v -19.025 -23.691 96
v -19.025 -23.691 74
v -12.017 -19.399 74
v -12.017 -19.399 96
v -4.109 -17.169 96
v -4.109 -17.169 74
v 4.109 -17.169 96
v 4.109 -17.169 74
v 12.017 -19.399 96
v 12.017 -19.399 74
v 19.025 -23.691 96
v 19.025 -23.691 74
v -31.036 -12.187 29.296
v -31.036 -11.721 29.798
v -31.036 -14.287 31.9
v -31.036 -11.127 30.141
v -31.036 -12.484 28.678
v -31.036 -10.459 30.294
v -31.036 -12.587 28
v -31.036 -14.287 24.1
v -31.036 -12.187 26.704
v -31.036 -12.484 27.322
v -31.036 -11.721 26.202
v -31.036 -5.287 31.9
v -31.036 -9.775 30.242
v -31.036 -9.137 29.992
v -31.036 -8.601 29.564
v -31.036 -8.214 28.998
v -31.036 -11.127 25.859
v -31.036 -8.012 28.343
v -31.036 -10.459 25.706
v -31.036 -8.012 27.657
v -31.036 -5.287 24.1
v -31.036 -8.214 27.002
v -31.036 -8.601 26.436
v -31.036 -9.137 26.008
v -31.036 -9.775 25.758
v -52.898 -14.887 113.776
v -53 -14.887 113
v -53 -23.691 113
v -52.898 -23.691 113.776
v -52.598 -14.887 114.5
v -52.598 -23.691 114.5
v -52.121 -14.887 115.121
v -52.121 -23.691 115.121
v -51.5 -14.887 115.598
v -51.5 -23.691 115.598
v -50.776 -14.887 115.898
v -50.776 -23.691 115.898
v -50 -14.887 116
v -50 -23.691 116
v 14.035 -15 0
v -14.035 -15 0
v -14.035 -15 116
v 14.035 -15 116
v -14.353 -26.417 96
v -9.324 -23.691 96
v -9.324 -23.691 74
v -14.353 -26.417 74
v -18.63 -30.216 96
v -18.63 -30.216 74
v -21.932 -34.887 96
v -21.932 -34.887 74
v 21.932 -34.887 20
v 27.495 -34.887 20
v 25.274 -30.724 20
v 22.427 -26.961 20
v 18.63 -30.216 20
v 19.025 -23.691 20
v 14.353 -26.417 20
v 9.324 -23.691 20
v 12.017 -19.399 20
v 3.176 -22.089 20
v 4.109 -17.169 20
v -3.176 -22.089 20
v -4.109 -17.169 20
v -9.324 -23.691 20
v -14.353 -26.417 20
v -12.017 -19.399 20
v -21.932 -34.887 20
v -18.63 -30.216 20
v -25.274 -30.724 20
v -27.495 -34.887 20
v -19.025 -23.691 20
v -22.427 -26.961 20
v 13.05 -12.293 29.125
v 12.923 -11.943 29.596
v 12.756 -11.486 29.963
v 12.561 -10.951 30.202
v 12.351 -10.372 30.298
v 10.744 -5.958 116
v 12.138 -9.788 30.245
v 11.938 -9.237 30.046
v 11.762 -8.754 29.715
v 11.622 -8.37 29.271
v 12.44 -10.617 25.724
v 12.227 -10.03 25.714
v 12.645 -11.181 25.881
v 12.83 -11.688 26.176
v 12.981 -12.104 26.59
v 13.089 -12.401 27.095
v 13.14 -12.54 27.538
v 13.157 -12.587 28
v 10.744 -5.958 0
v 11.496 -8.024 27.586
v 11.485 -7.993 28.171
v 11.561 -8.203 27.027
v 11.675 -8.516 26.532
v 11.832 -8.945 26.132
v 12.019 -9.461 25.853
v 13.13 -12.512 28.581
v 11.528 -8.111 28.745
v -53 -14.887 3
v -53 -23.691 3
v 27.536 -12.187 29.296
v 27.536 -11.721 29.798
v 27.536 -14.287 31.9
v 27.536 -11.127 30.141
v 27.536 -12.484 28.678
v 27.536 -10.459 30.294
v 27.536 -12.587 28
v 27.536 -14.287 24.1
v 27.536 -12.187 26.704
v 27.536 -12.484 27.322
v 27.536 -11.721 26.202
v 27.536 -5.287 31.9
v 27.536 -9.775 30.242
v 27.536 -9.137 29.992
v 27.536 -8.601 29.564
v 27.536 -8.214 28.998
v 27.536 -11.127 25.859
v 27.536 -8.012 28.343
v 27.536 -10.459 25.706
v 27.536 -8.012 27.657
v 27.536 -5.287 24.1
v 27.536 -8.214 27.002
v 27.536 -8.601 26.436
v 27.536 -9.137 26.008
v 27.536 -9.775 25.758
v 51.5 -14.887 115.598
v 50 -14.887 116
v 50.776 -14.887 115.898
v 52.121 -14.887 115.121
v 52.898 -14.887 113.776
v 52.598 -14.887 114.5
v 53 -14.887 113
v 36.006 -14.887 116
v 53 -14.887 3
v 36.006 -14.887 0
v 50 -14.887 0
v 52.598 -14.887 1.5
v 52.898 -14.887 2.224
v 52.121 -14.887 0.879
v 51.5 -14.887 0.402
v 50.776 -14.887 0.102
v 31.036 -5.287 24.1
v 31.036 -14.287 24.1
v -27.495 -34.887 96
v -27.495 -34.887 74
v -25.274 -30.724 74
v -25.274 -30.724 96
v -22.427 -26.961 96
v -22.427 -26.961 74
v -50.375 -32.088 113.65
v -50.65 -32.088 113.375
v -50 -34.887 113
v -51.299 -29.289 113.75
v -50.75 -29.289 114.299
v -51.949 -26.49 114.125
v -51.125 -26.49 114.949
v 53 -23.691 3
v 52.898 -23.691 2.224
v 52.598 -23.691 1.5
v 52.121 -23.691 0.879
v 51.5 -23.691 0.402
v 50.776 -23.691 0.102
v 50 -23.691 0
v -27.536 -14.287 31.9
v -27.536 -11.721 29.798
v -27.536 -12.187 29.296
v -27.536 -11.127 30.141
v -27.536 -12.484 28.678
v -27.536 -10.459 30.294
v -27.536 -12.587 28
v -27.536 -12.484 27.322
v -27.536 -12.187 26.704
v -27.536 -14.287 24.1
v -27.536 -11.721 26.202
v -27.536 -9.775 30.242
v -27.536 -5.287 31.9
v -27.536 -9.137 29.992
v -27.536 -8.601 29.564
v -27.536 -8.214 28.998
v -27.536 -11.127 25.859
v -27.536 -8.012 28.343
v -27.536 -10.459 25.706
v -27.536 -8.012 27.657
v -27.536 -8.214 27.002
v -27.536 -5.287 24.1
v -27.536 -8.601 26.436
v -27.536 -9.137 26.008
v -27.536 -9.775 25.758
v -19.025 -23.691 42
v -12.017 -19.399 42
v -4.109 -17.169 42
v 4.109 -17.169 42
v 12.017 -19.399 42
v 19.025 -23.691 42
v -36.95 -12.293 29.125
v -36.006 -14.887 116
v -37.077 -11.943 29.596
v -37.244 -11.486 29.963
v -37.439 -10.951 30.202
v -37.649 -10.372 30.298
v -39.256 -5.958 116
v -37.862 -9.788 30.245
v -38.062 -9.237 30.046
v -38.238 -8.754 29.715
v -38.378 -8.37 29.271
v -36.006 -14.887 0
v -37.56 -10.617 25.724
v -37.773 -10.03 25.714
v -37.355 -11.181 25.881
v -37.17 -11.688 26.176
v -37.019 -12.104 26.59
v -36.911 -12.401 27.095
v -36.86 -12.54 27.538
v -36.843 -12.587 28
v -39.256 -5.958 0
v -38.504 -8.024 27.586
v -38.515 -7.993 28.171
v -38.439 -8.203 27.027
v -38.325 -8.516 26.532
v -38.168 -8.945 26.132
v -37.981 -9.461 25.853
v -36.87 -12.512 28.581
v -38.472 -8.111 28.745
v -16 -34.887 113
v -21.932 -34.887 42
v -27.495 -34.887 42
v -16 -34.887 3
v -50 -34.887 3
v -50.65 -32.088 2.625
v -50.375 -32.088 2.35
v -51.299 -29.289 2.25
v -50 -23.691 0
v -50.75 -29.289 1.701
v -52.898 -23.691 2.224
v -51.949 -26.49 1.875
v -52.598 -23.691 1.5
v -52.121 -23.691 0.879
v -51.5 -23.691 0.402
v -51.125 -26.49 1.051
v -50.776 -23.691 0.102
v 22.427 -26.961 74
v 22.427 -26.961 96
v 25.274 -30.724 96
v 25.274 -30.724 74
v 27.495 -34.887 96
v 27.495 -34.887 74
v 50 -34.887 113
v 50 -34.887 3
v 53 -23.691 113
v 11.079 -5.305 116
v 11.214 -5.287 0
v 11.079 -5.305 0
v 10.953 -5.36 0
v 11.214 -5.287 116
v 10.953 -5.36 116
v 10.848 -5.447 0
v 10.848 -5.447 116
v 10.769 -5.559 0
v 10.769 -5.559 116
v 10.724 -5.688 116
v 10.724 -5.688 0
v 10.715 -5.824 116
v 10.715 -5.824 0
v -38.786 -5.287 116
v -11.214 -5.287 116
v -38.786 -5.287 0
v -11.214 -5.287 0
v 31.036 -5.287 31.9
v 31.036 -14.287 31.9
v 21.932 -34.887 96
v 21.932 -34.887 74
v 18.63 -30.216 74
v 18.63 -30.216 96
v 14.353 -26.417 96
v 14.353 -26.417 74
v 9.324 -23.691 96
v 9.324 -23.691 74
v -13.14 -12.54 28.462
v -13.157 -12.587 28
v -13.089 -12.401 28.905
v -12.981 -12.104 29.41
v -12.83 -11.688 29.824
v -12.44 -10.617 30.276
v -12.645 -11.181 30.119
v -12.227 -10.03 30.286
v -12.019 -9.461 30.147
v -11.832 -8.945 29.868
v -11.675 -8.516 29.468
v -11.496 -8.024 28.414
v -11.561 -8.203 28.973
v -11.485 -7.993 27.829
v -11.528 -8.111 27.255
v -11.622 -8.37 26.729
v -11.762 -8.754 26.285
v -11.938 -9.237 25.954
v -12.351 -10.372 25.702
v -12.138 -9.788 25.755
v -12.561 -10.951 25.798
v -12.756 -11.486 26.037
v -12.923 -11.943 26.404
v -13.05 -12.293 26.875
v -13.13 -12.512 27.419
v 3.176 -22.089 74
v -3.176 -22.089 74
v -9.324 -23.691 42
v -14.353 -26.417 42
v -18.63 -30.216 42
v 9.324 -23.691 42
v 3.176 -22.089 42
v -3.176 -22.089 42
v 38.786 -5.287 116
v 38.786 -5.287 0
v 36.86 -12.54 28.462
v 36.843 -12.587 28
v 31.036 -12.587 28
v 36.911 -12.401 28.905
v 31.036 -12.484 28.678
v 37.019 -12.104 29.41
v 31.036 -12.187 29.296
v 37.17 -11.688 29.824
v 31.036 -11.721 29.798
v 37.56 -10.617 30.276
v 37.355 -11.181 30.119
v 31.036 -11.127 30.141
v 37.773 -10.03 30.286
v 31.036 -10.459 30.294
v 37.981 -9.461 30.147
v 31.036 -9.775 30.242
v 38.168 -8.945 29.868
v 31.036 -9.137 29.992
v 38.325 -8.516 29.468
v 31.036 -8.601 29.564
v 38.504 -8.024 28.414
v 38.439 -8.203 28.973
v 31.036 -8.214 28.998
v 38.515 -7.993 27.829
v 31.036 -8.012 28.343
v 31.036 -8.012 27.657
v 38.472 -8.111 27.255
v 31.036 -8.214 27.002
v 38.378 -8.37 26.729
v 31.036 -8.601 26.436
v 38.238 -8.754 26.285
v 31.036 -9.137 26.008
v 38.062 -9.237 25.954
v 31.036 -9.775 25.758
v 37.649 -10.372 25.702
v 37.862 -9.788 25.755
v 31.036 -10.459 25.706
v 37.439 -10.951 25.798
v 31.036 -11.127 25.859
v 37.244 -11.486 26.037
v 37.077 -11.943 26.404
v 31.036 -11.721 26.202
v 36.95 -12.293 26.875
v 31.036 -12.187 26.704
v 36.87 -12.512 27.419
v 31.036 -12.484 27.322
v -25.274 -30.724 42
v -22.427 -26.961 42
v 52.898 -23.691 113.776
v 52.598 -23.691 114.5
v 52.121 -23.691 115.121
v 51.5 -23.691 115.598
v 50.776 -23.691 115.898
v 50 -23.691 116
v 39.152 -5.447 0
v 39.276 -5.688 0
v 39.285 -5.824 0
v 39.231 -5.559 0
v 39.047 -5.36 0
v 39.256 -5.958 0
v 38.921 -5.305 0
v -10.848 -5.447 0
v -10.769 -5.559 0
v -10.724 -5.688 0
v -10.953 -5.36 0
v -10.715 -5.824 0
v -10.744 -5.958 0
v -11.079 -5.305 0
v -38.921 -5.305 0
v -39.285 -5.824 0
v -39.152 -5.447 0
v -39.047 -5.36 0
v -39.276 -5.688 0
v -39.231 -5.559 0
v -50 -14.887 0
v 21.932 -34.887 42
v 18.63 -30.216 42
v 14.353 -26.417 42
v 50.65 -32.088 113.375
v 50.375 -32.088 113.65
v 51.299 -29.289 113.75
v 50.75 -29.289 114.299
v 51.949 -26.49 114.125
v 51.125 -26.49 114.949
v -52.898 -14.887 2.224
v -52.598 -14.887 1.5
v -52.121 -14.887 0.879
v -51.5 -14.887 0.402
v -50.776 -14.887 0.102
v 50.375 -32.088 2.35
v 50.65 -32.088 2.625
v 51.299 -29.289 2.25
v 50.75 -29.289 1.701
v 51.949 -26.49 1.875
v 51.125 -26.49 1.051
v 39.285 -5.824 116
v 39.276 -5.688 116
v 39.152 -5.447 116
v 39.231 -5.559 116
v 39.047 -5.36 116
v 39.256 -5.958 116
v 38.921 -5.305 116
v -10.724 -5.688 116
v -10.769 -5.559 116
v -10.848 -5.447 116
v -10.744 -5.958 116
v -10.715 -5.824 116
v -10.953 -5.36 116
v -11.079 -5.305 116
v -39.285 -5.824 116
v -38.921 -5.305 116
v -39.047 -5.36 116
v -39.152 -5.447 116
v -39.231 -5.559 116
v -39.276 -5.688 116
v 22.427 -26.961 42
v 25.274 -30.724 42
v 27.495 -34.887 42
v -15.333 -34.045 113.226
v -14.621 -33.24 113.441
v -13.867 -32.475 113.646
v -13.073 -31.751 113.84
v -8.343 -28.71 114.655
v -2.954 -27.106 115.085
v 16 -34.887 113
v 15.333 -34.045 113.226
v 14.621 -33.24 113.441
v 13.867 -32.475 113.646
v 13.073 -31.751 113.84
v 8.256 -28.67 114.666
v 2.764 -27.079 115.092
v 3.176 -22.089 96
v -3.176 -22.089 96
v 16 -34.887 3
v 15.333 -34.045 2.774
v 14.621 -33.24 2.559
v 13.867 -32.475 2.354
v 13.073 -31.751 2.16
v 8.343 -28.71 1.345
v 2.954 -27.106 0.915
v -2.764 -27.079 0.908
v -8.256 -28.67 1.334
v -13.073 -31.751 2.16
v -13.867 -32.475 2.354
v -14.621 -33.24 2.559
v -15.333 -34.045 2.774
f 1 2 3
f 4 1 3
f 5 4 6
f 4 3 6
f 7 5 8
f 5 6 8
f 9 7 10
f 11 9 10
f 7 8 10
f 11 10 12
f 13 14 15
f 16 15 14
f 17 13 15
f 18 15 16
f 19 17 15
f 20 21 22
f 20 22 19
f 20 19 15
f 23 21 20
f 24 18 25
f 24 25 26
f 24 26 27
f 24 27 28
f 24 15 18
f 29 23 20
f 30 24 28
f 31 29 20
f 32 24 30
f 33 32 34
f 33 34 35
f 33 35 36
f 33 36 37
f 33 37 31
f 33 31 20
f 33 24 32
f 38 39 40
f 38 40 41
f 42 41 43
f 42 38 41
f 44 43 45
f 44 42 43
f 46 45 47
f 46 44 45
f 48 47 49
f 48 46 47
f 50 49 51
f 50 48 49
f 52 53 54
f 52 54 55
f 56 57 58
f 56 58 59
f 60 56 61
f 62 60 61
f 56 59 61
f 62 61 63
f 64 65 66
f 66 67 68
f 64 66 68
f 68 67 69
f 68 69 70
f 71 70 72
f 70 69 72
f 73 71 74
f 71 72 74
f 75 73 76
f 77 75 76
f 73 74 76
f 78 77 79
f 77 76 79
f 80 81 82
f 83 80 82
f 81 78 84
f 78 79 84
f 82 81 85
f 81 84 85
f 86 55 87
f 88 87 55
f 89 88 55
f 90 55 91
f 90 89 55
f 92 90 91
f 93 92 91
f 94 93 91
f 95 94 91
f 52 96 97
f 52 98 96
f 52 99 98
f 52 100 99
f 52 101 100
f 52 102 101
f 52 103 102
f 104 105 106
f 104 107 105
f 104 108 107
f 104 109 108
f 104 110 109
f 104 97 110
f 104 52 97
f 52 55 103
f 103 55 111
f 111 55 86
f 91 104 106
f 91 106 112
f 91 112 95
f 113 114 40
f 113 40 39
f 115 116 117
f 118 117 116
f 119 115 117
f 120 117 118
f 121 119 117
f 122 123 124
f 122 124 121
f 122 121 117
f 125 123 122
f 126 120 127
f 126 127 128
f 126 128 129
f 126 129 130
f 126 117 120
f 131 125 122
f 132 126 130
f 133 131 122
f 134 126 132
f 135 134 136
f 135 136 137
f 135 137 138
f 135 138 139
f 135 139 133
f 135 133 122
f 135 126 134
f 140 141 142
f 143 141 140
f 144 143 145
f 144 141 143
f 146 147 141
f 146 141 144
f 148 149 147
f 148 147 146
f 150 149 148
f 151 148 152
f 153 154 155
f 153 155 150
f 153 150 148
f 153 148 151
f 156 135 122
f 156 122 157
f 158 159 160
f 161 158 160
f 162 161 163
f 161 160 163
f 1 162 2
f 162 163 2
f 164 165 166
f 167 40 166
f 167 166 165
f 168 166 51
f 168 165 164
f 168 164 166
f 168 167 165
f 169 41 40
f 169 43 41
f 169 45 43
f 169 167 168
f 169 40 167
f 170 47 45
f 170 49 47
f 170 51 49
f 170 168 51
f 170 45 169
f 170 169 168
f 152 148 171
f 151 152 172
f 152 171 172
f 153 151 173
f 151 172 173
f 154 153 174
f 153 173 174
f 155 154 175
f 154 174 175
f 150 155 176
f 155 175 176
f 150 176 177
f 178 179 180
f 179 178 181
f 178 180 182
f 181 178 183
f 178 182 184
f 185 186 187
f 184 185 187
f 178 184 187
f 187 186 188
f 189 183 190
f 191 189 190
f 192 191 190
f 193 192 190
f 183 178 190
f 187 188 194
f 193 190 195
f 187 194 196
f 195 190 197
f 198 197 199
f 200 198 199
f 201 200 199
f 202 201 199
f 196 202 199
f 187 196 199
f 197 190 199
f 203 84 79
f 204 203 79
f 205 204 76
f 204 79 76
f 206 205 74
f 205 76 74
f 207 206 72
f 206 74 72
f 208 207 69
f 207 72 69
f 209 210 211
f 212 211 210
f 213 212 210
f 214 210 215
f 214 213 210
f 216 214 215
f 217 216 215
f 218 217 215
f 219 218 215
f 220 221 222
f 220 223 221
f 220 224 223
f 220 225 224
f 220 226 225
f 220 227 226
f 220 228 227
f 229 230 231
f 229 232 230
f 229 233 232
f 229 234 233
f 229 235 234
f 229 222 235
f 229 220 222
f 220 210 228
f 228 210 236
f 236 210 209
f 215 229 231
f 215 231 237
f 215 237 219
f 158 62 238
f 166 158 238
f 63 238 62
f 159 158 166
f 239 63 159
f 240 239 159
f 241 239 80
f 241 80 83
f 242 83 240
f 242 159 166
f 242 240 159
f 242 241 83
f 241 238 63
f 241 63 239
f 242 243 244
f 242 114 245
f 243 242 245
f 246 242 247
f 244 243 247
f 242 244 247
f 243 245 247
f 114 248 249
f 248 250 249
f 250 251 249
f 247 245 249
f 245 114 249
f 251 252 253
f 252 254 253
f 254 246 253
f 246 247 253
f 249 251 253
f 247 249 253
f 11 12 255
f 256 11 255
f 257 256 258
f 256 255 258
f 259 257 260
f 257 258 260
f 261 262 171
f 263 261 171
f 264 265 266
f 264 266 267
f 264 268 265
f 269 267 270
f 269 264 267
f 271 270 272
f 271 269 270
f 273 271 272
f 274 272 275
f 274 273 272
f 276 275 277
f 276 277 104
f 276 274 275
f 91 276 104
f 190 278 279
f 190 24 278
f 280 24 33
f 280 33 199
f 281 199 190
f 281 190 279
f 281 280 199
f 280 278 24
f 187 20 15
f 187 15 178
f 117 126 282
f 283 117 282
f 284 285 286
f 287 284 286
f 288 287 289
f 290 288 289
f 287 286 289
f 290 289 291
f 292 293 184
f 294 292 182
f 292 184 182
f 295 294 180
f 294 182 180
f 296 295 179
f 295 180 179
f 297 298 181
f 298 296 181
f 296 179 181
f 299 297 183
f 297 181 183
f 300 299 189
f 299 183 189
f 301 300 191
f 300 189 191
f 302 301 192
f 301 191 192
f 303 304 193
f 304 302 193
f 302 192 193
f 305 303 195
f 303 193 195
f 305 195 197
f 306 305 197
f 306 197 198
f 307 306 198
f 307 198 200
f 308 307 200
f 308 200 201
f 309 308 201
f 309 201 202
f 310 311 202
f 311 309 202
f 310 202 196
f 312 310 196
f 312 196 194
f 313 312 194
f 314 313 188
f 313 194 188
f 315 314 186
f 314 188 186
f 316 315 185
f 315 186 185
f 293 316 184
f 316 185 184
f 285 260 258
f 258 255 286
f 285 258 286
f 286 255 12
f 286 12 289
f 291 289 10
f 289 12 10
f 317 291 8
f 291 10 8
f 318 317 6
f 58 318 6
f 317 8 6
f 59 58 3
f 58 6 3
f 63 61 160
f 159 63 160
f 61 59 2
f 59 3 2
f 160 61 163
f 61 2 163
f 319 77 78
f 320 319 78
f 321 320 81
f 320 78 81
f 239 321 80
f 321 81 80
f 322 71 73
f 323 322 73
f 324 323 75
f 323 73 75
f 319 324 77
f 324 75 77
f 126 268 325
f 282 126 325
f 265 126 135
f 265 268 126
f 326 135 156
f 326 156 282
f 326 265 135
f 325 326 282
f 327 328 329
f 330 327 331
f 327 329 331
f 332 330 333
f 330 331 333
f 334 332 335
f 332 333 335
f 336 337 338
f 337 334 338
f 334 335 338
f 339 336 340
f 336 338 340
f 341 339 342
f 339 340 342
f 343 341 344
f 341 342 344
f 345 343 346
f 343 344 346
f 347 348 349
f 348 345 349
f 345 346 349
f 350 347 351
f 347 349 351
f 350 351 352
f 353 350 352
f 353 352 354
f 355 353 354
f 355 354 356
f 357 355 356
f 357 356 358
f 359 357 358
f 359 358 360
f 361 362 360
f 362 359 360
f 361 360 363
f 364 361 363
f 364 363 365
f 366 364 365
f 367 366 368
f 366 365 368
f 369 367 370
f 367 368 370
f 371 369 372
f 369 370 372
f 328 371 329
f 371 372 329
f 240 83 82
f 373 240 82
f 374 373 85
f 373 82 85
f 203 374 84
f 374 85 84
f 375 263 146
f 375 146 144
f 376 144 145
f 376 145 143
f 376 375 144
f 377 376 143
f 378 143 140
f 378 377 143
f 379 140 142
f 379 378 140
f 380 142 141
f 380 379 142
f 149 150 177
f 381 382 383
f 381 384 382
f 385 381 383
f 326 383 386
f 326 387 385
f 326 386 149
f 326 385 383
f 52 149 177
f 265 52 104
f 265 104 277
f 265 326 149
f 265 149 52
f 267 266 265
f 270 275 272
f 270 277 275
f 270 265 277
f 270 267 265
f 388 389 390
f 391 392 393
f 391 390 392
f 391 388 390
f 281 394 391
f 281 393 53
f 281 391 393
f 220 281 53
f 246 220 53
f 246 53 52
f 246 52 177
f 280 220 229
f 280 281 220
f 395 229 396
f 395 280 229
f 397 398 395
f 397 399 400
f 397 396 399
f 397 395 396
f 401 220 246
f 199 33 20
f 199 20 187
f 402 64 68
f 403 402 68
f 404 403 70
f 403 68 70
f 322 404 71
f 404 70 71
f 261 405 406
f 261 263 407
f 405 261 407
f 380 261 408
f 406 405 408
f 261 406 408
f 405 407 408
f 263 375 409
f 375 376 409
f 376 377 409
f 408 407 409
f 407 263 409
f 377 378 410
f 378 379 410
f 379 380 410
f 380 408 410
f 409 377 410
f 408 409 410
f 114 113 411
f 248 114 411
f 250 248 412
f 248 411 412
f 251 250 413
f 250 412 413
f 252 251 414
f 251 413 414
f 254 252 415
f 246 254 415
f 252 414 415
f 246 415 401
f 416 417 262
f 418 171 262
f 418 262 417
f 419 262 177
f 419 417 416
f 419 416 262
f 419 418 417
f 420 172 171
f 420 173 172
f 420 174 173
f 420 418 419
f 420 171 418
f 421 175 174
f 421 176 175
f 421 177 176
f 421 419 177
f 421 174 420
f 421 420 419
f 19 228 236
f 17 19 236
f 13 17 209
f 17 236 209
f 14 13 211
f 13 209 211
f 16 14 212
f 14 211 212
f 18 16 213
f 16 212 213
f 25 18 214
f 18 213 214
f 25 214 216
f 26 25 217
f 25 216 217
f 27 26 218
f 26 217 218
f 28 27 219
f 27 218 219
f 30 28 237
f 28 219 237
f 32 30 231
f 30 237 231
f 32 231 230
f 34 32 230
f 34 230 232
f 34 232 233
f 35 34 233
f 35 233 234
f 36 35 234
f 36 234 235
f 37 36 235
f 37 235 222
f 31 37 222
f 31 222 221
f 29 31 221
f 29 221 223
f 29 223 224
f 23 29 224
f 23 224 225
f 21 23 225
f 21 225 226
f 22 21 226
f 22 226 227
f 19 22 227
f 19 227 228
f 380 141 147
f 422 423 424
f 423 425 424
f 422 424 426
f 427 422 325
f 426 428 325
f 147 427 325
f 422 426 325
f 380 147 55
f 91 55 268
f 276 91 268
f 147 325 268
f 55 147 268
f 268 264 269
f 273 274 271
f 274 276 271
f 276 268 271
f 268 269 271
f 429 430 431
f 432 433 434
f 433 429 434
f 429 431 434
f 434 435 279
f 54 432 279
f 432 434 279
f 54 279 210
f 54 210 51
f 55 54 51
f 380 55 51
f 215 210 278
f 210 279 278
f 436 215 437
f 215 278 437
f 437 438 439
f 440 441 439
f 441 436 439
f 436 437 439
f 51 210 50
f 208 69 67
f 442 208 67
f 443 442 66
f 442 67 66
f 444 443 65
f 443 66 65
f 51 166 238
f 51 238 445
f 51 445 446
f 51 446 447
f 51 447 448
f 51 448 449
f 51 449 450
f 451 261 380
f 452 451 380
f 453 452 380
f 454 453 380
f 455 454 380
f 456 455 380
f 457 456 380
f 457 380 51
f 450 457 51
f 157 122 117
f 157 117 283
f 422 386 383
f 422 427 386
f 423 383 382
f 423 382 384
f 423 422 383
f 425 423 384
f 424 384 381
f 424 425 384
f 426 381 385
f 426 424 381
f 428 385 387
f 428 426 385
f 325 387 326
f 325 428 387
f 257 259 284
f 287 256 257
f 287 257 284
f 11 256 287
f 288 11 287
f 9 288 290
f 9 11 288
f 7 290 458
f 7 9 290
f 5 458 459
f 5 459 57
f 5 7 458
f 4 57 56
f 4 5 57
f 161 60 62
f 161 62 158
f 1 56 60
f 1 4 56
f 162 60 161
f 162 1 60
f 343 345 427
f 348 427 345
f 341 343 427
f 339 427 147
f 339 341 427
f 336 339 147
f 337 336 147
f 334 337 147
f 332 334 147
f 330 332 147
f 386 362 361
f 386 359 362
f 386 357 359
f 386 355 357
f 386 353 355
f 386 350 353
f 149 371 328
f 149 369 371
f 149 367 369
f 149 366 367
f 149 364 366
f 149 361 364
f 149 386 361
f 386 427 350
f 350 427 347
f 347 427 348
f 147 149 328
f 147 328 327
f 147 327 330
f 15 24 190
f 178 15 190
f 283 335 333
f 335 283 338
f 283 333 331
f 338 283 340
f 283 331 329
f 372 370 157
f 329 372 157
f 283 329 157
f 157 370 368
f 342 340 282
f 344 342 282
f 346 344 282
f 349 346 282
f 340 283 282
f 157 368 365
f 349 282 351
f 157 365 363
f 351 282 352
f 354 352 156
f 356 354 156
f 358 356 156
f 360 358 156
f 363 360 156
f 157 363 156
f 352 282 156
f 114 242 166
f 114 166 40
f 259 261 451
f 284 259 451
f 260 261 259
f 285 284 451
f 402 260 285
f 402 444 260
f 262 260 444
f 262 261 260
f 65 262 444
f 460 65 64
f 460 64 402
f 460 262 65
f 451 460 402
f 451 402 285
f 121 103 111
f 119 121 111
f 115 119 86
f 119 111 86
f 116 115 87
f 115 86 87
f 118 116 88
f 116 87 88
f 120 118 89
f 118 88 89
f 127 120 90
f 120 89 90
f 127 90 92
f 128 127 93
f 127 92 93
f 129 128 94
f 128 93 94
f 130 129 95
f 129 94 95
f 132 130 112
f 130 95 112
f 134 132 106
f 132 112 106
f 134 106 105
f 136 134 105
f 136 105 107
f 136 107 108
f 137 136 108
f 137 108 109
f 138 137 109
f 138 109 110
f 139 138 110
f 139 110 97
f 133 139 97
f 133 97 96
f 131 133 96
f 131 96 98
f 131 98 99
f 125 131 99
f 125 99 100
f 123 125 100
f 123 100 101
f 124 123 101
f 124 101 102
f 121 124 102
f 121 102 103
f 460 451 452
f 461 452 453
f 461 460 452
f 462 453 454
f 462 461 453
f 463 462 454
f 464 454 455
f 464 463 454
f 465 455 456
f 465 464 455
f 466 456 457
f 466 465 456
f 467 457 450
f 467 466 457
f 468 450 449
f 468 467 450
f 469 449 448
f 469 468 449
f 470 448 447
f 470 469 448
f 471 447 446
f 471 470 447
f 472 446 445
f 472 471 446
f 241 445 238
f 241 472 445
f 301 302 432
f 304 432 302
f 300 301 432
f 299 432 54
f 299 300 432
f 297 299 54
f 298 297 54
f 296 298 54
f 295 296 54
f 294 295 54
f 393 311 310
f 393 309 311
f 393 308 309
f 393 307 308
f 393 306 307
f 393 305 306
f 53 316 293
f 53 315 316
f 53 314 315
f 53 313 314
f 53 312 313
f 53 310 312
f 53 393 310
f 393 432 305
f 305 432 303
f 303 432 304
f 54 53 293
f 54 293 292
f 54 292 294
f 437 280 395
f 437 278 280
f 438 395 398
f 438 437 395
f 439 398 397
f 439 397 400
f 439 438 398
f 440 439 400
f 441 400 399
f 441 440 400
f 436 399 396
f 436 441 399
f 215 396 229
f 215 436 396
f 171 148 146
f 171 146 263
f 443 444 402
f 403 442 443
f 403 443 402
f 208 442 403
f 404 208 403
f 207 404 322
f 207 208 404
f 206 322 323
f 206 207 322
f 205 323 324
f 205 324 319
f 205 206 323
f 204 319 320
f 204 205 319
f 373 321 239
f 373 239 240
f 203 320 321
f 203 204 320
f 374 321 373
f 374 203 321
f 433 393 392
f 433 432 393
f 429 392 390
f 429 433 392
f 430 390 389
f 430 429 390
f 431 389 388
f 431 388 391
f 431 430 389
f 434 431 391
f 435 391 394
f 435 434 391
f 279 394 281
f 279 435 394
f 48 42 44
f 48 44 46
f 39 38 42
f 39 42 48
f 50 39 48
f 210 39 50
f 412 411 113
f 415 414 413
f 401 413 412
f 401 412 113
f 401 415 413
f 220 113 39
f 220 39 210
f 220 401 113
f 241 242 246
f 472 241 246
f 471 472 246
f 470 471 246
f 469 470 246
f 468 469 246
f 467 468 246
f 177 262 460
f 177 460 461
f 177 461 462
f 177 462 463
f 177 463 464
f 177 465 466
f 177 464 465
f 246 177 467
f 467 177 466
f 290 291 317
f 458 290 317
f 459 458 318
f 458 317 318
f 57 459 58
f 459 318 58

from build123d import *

# Parameters (mm, degrees)
BOSS_EXTRUDE1_DEPTH = 116
FILLET1_R           = 3
CHAMFER2_SIZE       = 3
CHAMFER2_SIZE_2     = 11.196152423
FILLET2_R           = 0.5
SKETCH3_W           = 3.5
SKETCH3_H           = 7.8
CUT_EXTRUDE1_DEPTH  = 9
SKETCH4_R           = 2.3
CUT_EXTRUDE2_DEPTH  = 161.962973694
CUT_EXTRUDE3_START  = -20
CUT_EXTRUDE3_DEPTH  = 22
CUT_EXTRUDE4_START  = -74
CUT_EXTRUDE4_DEPTH  = 22


with BuildPart() as part:
    # Sketch2 → Boss-Extrude1 (new body)
    with BuildSketch(Plane.XY):
        with BuildLine():
            Line((-39.5, -5.286657915), (-10.5, -5.286657915))
            Line((-10.5, -5.286657915), (-14.035367394, -15))
            Line((-14.035367394, -15), (14.035367394, -15))
            Line((14.035367394, -15), (10.5, -5.286657915))
            Line((10.5, -5.286657915), (39.5, -5.286657915))
            Line((39.5, -5.286657915), (36.005885751, -14.886657915))
            Line((36.005885751, -14.886657915), (53, -14.886657915))
            Line((53, -14.886657915), (53, -34.886657915))
            Line((53, -34.886657915), (16, -34.886657915))
            ThreePointArc((16, -34.886657915), (0, -26.886657915), (-16, -34.886657915))
            Line((-16, -34.886657915), (-53, -34.886657915))
            Line((-53, -34.886657915), (-53, -14.886657915))
            Line((-53, -14.886657915), (-36.005885751, -14.886657915))
            Line((-36.005885751, -14.886657915), (-39.5, -5.286657915))
        make_face()
    extrude(amount=BOSS_EXTRUDE1_DEPTH)

    # Fillet1
    fillet1_edges = [part.edges().sort_by_distance(p)[0] for p in [
        (-53, -24.886657915, 0),
        (53, -24.886657915, 0),
        (-53, -24.886657915, 116),
        (53, -24.886657915, 116),
    ]]
    fillet(fillet1_edges, radius=FILLET1_R)

    # Chamfer2
    # the kernel refuses this chamfer: 11.196152423, 3 mm, written as the material it takes off along each edge
    with BuildSketch(Plane(origin=(50, -34.886657915, 3), x_dir=(1, 0, 0), z_dir=(0, 0, 1))) as chamfer2_piece_1:
        Polygon((3 - CHAMFER2_SIZE, 0), (3, CHAMFER2_SIZE_2), (3, 0), align=None)
    revolve(axis=Axis((50, -34.886657915, 3), (0, 1, 0)), revolution_arc=90, mode=Mode.SUBTRACT)
    with BuildSketch(Plane(origin=(50, -34.886657915, 116), x_dir=(0, 1, 0), z_dir=(-1, 0, 0))) as chamfer2_piece_2:
        Polygon((CHAMFER2_SIZE_2, 0), (0, CHAMFER2_SIZE), (0, 0), align=None)
    extrude(amount=63.073290499, mode=Mode.SUBTRACT)
    with BuildSketch(Plane(origin=(13.073290499, -34.886657915, 0), x_dir=(0, 0, 1), z_dir=(-1, 0, 0))) as chamfer2_piece_3:
        Polygon((CHAMFER2_SIZE, 0), (0, CHAMFER2_SIZE_2), (0, 0), align=None)
    extrude(amount=63.073290499, mode=Mode.SUBTRACT)
    with BuildSketch(Plane(origin=(-50, -34.886657915, 113), x_dir=(-1, 0, 0), z_dir=(0, 0, -1))) as chamfer2_piece_4:
        Polygon((3 - CHAMFER2_SIZE, 0), (3, CHAMFER2_SIZE_2), (3, 0), align=None)
    revolve(axis=Axis((-50, -34.886657915, 113), (0, 1, 0)), revolution_arc=90, mode=Mode.SUBTRACT)
    with BuildSketch(Plane(origin=(-53, -34.886657915, 3), x_dir=(1, 0, 0), z_dir=(0, 0, 1))) as chamfer2_piece_5:
        Polygon((CHAMFER2_SIZE, 0), (0, CHAMFER2_SIZE_2), (0, 0), align=None)
    extrude(amount=110, mode=Mode.SUBTRACT)
    with BuildSketch(Plane(origin=(-50, -34.886657915, 3), x_dir=(-1, 0, 0), z_dir=(0, 0, 1))) as chamfer2_piece_6:
        Polygon((3 - CHAMFER2_SIZE, 0), (3, -CHAMFER2_SIZE_2), (3, 0), align=None)
    revolve(axis=Axis((-50, -34.886657915, 3), (0, -1, 0)), revolution_arc=90, mode=Mode.SUBTRACT)
    with BuildSketch(Plane(origin=(13.073290499, -34.886657915, 116), x_dir=(0, 0, -1), z_dir=(-1, 0, 0))) as chamfer2_piece_7:
        Polygon((CHAMFER2_SIZE, 0), (0, -CHAMFER2_SIZE_2), (0, 0), align=None)
    extrude(amount=63.073290499, mode=Mode.SUBTRACT)
    with BuildSketch(Plane(origin=(50, -34.886657915, 113), x_dir=(1, 0, 0), z_dir=(0, 0, -1))) as chamfer2_piece_8:
        Polygon((3 - CHAMFER2_SIZE, 0), (3, -CHAMFER2_SIZE_2), (3, 0), align=None)
    revolve(axis=Axis((50, -34.886657915, 113), (0, -1, 0)), revolution_arc=90, mode=Mode.SUBTRACT)
    with BuildSketch(Plane(origin=(53, -34.886657915, 3), x_dir=(-1, 0, 0), z_dir=(0, 0, 1))) as chamfer2_piece_9:
        Polygon((CHAMFER2_SIZE, 0), (0, -CHAMFER2_SIZE_2), (0, 0), align=None)
    extrude(amount=110, mode=Mode.SUBTRACT)
    with BuildSketch(Plane(origin=(50, -34.886657915, 0), x_dir=(0, 1, 0), z_dir=(-1, 0, 0))) as chamfer2_piece_10:
        Polygon((CHAMFER2_SIZE_2, 0), (0, -CHAMFER2_SIZE), (0, 0), align=None)
    extrude(amount=63.073290499, mode=Mode.SUBTRACT)

    # Fillet2
    fillet2_edges = [part.edges().sort_by_distance(p)[0] for p in [
        (39.5, -5.286657915, 58),
        (10.5, -5.286657915, 58),
        (-10.5, -5.286657915, 58),
        (-39.5, -5.286657915, 58),
    ]]
    fillet(fillet2_edges, radius=FILLET2_R)

    # Sketch3 → Cut-Extrude1 (cut)
    with BuildSketch(Plane(origin=(0, -5.286657915, 0), x_dir=(1, 0, 0), z_dir=(0, 1, 0))):
        with Locations((-29.285925997, -28)):
            Rectangle(SKETCH3_W, SKETCH3_H)
        with Locations((29.285925997, -28)):
            Rectangle(SKETCH3_W, SKETCH3_H)
    extrude(amount=-CUT_EXTRUDE1_DEPTH, mode=Mode.SUBTRACT)

    # Sketch4 → Cut-Extrude2 (cut, through all)
    with BuildSketch(Plane.ZY.offset(53)):
        with Locations(Location((28, -10.286657915, 0), (0, 0, 270))):
            Circle(SKETCH4_R)
    extrude(amount=-CUT_EXTRUDE2_DEPTH, mode=Mode.SUBTRACT)

    # Sketch5 → Cut-Extrude3 (cut)
    with BuildSketch(Plane(origin=(0, 0, 0), x_dir=(-1, 0, 0), z_dir=(0, 0, -1)).offset(CUT_EXTRUDE3_START)):
        with BuildLine():
            ThreePointArc((9.324082409, -23.690505492), (20.713547019, -32.888480537), (25, -46.886657915))
            ThreePointArc((25, -46.886657915), (-13.998177377, -67.600204934), (-9.324082409, -23.690505492))
            Line((-9.324082409, -23.690505492), (-19.024681673, -23.690505492))
            ThreePointArc((-19.024681673, -23.690505492), (-12.830813493, -74.004368458), (30, -46.886657915))
            ThreePointArc((30, -46.886657915), (27.117710543, -34.055844421), (19.024681673, -23.690505492))
            Line((19.024681673, -23.690505492), (9.324082409, -23.690505492))
        make_face()
        with BuildLine():
            ThreePointArc((-9.324082409, -23.690505492), (0, -21.886657915), (9.324082409, -23.690505492))
            Line((9.324082409, -23.690505492), (19.024681673, -23.690505492))
            ThreePointArc((19.024681673, -23.690505492), (0, -16.886657915), (-19.024681673, -23.690505492))
            Line((-19.024681673, -23.690505492), (-9.324082409, -23.690505492))
        make_face()
    extrude(amount=-CUT_EXTRUDE3_DEPTH, mode=Mode.SUBTRACT)

    # Sketch5<3> → Cut-Extrude4 (cut)
    with BuildSketch(Plane(origin=(0, 0, 0), x_dir=(-1, 0, 0), z_dir=(0, 0, -1)).offset(CUT_EXTRUDE4_START)):
        with BuildLine():
            ThreePointArc((9.324082409, -23.690505492), (20.713547019, -32.888480537), (25, -46.886657915))
            ThreePointArc((25, -46.886657915), (-13.998177377, -67.600204934), (-9.324082409, -23.690505492))
            Line((-9.324082409, -23.690505492), (-19.024681673, -23.690505492))
            ThreePointArc((-19.024681673, -23.690505492), (-12.830813493, -74.004368458), (30, -46.886657915))
            ThreePointArc((30, -46.886657915), (27.117710543, -34.055844421), (19.024681673, -23.690505492))
            Line((19.024681673, -23.690505492), (9.324082409, -23.690505492))
        make_face()
        with BuildLine():
            ThreePointArc((-9.324082409, -23.690505492), (0, -21.886657915), (9.324082409, -23.690505492))
            Line((9.324082409, -23.690505492), (19.024681673, -23.690505492))
            ThreePointArc((19.024681673, -23.690505492), (0, -16.886657915), (-19.024681673, -23.690505492))
            Line((-19.024681673, -23.690505492), (-9.324082409, -23.690505492))
        make_face()
    extrude(amount=-CUT_EXTRUDE4_DEPTH, mode=Mode.SUBTRACT)


solid = part.part
